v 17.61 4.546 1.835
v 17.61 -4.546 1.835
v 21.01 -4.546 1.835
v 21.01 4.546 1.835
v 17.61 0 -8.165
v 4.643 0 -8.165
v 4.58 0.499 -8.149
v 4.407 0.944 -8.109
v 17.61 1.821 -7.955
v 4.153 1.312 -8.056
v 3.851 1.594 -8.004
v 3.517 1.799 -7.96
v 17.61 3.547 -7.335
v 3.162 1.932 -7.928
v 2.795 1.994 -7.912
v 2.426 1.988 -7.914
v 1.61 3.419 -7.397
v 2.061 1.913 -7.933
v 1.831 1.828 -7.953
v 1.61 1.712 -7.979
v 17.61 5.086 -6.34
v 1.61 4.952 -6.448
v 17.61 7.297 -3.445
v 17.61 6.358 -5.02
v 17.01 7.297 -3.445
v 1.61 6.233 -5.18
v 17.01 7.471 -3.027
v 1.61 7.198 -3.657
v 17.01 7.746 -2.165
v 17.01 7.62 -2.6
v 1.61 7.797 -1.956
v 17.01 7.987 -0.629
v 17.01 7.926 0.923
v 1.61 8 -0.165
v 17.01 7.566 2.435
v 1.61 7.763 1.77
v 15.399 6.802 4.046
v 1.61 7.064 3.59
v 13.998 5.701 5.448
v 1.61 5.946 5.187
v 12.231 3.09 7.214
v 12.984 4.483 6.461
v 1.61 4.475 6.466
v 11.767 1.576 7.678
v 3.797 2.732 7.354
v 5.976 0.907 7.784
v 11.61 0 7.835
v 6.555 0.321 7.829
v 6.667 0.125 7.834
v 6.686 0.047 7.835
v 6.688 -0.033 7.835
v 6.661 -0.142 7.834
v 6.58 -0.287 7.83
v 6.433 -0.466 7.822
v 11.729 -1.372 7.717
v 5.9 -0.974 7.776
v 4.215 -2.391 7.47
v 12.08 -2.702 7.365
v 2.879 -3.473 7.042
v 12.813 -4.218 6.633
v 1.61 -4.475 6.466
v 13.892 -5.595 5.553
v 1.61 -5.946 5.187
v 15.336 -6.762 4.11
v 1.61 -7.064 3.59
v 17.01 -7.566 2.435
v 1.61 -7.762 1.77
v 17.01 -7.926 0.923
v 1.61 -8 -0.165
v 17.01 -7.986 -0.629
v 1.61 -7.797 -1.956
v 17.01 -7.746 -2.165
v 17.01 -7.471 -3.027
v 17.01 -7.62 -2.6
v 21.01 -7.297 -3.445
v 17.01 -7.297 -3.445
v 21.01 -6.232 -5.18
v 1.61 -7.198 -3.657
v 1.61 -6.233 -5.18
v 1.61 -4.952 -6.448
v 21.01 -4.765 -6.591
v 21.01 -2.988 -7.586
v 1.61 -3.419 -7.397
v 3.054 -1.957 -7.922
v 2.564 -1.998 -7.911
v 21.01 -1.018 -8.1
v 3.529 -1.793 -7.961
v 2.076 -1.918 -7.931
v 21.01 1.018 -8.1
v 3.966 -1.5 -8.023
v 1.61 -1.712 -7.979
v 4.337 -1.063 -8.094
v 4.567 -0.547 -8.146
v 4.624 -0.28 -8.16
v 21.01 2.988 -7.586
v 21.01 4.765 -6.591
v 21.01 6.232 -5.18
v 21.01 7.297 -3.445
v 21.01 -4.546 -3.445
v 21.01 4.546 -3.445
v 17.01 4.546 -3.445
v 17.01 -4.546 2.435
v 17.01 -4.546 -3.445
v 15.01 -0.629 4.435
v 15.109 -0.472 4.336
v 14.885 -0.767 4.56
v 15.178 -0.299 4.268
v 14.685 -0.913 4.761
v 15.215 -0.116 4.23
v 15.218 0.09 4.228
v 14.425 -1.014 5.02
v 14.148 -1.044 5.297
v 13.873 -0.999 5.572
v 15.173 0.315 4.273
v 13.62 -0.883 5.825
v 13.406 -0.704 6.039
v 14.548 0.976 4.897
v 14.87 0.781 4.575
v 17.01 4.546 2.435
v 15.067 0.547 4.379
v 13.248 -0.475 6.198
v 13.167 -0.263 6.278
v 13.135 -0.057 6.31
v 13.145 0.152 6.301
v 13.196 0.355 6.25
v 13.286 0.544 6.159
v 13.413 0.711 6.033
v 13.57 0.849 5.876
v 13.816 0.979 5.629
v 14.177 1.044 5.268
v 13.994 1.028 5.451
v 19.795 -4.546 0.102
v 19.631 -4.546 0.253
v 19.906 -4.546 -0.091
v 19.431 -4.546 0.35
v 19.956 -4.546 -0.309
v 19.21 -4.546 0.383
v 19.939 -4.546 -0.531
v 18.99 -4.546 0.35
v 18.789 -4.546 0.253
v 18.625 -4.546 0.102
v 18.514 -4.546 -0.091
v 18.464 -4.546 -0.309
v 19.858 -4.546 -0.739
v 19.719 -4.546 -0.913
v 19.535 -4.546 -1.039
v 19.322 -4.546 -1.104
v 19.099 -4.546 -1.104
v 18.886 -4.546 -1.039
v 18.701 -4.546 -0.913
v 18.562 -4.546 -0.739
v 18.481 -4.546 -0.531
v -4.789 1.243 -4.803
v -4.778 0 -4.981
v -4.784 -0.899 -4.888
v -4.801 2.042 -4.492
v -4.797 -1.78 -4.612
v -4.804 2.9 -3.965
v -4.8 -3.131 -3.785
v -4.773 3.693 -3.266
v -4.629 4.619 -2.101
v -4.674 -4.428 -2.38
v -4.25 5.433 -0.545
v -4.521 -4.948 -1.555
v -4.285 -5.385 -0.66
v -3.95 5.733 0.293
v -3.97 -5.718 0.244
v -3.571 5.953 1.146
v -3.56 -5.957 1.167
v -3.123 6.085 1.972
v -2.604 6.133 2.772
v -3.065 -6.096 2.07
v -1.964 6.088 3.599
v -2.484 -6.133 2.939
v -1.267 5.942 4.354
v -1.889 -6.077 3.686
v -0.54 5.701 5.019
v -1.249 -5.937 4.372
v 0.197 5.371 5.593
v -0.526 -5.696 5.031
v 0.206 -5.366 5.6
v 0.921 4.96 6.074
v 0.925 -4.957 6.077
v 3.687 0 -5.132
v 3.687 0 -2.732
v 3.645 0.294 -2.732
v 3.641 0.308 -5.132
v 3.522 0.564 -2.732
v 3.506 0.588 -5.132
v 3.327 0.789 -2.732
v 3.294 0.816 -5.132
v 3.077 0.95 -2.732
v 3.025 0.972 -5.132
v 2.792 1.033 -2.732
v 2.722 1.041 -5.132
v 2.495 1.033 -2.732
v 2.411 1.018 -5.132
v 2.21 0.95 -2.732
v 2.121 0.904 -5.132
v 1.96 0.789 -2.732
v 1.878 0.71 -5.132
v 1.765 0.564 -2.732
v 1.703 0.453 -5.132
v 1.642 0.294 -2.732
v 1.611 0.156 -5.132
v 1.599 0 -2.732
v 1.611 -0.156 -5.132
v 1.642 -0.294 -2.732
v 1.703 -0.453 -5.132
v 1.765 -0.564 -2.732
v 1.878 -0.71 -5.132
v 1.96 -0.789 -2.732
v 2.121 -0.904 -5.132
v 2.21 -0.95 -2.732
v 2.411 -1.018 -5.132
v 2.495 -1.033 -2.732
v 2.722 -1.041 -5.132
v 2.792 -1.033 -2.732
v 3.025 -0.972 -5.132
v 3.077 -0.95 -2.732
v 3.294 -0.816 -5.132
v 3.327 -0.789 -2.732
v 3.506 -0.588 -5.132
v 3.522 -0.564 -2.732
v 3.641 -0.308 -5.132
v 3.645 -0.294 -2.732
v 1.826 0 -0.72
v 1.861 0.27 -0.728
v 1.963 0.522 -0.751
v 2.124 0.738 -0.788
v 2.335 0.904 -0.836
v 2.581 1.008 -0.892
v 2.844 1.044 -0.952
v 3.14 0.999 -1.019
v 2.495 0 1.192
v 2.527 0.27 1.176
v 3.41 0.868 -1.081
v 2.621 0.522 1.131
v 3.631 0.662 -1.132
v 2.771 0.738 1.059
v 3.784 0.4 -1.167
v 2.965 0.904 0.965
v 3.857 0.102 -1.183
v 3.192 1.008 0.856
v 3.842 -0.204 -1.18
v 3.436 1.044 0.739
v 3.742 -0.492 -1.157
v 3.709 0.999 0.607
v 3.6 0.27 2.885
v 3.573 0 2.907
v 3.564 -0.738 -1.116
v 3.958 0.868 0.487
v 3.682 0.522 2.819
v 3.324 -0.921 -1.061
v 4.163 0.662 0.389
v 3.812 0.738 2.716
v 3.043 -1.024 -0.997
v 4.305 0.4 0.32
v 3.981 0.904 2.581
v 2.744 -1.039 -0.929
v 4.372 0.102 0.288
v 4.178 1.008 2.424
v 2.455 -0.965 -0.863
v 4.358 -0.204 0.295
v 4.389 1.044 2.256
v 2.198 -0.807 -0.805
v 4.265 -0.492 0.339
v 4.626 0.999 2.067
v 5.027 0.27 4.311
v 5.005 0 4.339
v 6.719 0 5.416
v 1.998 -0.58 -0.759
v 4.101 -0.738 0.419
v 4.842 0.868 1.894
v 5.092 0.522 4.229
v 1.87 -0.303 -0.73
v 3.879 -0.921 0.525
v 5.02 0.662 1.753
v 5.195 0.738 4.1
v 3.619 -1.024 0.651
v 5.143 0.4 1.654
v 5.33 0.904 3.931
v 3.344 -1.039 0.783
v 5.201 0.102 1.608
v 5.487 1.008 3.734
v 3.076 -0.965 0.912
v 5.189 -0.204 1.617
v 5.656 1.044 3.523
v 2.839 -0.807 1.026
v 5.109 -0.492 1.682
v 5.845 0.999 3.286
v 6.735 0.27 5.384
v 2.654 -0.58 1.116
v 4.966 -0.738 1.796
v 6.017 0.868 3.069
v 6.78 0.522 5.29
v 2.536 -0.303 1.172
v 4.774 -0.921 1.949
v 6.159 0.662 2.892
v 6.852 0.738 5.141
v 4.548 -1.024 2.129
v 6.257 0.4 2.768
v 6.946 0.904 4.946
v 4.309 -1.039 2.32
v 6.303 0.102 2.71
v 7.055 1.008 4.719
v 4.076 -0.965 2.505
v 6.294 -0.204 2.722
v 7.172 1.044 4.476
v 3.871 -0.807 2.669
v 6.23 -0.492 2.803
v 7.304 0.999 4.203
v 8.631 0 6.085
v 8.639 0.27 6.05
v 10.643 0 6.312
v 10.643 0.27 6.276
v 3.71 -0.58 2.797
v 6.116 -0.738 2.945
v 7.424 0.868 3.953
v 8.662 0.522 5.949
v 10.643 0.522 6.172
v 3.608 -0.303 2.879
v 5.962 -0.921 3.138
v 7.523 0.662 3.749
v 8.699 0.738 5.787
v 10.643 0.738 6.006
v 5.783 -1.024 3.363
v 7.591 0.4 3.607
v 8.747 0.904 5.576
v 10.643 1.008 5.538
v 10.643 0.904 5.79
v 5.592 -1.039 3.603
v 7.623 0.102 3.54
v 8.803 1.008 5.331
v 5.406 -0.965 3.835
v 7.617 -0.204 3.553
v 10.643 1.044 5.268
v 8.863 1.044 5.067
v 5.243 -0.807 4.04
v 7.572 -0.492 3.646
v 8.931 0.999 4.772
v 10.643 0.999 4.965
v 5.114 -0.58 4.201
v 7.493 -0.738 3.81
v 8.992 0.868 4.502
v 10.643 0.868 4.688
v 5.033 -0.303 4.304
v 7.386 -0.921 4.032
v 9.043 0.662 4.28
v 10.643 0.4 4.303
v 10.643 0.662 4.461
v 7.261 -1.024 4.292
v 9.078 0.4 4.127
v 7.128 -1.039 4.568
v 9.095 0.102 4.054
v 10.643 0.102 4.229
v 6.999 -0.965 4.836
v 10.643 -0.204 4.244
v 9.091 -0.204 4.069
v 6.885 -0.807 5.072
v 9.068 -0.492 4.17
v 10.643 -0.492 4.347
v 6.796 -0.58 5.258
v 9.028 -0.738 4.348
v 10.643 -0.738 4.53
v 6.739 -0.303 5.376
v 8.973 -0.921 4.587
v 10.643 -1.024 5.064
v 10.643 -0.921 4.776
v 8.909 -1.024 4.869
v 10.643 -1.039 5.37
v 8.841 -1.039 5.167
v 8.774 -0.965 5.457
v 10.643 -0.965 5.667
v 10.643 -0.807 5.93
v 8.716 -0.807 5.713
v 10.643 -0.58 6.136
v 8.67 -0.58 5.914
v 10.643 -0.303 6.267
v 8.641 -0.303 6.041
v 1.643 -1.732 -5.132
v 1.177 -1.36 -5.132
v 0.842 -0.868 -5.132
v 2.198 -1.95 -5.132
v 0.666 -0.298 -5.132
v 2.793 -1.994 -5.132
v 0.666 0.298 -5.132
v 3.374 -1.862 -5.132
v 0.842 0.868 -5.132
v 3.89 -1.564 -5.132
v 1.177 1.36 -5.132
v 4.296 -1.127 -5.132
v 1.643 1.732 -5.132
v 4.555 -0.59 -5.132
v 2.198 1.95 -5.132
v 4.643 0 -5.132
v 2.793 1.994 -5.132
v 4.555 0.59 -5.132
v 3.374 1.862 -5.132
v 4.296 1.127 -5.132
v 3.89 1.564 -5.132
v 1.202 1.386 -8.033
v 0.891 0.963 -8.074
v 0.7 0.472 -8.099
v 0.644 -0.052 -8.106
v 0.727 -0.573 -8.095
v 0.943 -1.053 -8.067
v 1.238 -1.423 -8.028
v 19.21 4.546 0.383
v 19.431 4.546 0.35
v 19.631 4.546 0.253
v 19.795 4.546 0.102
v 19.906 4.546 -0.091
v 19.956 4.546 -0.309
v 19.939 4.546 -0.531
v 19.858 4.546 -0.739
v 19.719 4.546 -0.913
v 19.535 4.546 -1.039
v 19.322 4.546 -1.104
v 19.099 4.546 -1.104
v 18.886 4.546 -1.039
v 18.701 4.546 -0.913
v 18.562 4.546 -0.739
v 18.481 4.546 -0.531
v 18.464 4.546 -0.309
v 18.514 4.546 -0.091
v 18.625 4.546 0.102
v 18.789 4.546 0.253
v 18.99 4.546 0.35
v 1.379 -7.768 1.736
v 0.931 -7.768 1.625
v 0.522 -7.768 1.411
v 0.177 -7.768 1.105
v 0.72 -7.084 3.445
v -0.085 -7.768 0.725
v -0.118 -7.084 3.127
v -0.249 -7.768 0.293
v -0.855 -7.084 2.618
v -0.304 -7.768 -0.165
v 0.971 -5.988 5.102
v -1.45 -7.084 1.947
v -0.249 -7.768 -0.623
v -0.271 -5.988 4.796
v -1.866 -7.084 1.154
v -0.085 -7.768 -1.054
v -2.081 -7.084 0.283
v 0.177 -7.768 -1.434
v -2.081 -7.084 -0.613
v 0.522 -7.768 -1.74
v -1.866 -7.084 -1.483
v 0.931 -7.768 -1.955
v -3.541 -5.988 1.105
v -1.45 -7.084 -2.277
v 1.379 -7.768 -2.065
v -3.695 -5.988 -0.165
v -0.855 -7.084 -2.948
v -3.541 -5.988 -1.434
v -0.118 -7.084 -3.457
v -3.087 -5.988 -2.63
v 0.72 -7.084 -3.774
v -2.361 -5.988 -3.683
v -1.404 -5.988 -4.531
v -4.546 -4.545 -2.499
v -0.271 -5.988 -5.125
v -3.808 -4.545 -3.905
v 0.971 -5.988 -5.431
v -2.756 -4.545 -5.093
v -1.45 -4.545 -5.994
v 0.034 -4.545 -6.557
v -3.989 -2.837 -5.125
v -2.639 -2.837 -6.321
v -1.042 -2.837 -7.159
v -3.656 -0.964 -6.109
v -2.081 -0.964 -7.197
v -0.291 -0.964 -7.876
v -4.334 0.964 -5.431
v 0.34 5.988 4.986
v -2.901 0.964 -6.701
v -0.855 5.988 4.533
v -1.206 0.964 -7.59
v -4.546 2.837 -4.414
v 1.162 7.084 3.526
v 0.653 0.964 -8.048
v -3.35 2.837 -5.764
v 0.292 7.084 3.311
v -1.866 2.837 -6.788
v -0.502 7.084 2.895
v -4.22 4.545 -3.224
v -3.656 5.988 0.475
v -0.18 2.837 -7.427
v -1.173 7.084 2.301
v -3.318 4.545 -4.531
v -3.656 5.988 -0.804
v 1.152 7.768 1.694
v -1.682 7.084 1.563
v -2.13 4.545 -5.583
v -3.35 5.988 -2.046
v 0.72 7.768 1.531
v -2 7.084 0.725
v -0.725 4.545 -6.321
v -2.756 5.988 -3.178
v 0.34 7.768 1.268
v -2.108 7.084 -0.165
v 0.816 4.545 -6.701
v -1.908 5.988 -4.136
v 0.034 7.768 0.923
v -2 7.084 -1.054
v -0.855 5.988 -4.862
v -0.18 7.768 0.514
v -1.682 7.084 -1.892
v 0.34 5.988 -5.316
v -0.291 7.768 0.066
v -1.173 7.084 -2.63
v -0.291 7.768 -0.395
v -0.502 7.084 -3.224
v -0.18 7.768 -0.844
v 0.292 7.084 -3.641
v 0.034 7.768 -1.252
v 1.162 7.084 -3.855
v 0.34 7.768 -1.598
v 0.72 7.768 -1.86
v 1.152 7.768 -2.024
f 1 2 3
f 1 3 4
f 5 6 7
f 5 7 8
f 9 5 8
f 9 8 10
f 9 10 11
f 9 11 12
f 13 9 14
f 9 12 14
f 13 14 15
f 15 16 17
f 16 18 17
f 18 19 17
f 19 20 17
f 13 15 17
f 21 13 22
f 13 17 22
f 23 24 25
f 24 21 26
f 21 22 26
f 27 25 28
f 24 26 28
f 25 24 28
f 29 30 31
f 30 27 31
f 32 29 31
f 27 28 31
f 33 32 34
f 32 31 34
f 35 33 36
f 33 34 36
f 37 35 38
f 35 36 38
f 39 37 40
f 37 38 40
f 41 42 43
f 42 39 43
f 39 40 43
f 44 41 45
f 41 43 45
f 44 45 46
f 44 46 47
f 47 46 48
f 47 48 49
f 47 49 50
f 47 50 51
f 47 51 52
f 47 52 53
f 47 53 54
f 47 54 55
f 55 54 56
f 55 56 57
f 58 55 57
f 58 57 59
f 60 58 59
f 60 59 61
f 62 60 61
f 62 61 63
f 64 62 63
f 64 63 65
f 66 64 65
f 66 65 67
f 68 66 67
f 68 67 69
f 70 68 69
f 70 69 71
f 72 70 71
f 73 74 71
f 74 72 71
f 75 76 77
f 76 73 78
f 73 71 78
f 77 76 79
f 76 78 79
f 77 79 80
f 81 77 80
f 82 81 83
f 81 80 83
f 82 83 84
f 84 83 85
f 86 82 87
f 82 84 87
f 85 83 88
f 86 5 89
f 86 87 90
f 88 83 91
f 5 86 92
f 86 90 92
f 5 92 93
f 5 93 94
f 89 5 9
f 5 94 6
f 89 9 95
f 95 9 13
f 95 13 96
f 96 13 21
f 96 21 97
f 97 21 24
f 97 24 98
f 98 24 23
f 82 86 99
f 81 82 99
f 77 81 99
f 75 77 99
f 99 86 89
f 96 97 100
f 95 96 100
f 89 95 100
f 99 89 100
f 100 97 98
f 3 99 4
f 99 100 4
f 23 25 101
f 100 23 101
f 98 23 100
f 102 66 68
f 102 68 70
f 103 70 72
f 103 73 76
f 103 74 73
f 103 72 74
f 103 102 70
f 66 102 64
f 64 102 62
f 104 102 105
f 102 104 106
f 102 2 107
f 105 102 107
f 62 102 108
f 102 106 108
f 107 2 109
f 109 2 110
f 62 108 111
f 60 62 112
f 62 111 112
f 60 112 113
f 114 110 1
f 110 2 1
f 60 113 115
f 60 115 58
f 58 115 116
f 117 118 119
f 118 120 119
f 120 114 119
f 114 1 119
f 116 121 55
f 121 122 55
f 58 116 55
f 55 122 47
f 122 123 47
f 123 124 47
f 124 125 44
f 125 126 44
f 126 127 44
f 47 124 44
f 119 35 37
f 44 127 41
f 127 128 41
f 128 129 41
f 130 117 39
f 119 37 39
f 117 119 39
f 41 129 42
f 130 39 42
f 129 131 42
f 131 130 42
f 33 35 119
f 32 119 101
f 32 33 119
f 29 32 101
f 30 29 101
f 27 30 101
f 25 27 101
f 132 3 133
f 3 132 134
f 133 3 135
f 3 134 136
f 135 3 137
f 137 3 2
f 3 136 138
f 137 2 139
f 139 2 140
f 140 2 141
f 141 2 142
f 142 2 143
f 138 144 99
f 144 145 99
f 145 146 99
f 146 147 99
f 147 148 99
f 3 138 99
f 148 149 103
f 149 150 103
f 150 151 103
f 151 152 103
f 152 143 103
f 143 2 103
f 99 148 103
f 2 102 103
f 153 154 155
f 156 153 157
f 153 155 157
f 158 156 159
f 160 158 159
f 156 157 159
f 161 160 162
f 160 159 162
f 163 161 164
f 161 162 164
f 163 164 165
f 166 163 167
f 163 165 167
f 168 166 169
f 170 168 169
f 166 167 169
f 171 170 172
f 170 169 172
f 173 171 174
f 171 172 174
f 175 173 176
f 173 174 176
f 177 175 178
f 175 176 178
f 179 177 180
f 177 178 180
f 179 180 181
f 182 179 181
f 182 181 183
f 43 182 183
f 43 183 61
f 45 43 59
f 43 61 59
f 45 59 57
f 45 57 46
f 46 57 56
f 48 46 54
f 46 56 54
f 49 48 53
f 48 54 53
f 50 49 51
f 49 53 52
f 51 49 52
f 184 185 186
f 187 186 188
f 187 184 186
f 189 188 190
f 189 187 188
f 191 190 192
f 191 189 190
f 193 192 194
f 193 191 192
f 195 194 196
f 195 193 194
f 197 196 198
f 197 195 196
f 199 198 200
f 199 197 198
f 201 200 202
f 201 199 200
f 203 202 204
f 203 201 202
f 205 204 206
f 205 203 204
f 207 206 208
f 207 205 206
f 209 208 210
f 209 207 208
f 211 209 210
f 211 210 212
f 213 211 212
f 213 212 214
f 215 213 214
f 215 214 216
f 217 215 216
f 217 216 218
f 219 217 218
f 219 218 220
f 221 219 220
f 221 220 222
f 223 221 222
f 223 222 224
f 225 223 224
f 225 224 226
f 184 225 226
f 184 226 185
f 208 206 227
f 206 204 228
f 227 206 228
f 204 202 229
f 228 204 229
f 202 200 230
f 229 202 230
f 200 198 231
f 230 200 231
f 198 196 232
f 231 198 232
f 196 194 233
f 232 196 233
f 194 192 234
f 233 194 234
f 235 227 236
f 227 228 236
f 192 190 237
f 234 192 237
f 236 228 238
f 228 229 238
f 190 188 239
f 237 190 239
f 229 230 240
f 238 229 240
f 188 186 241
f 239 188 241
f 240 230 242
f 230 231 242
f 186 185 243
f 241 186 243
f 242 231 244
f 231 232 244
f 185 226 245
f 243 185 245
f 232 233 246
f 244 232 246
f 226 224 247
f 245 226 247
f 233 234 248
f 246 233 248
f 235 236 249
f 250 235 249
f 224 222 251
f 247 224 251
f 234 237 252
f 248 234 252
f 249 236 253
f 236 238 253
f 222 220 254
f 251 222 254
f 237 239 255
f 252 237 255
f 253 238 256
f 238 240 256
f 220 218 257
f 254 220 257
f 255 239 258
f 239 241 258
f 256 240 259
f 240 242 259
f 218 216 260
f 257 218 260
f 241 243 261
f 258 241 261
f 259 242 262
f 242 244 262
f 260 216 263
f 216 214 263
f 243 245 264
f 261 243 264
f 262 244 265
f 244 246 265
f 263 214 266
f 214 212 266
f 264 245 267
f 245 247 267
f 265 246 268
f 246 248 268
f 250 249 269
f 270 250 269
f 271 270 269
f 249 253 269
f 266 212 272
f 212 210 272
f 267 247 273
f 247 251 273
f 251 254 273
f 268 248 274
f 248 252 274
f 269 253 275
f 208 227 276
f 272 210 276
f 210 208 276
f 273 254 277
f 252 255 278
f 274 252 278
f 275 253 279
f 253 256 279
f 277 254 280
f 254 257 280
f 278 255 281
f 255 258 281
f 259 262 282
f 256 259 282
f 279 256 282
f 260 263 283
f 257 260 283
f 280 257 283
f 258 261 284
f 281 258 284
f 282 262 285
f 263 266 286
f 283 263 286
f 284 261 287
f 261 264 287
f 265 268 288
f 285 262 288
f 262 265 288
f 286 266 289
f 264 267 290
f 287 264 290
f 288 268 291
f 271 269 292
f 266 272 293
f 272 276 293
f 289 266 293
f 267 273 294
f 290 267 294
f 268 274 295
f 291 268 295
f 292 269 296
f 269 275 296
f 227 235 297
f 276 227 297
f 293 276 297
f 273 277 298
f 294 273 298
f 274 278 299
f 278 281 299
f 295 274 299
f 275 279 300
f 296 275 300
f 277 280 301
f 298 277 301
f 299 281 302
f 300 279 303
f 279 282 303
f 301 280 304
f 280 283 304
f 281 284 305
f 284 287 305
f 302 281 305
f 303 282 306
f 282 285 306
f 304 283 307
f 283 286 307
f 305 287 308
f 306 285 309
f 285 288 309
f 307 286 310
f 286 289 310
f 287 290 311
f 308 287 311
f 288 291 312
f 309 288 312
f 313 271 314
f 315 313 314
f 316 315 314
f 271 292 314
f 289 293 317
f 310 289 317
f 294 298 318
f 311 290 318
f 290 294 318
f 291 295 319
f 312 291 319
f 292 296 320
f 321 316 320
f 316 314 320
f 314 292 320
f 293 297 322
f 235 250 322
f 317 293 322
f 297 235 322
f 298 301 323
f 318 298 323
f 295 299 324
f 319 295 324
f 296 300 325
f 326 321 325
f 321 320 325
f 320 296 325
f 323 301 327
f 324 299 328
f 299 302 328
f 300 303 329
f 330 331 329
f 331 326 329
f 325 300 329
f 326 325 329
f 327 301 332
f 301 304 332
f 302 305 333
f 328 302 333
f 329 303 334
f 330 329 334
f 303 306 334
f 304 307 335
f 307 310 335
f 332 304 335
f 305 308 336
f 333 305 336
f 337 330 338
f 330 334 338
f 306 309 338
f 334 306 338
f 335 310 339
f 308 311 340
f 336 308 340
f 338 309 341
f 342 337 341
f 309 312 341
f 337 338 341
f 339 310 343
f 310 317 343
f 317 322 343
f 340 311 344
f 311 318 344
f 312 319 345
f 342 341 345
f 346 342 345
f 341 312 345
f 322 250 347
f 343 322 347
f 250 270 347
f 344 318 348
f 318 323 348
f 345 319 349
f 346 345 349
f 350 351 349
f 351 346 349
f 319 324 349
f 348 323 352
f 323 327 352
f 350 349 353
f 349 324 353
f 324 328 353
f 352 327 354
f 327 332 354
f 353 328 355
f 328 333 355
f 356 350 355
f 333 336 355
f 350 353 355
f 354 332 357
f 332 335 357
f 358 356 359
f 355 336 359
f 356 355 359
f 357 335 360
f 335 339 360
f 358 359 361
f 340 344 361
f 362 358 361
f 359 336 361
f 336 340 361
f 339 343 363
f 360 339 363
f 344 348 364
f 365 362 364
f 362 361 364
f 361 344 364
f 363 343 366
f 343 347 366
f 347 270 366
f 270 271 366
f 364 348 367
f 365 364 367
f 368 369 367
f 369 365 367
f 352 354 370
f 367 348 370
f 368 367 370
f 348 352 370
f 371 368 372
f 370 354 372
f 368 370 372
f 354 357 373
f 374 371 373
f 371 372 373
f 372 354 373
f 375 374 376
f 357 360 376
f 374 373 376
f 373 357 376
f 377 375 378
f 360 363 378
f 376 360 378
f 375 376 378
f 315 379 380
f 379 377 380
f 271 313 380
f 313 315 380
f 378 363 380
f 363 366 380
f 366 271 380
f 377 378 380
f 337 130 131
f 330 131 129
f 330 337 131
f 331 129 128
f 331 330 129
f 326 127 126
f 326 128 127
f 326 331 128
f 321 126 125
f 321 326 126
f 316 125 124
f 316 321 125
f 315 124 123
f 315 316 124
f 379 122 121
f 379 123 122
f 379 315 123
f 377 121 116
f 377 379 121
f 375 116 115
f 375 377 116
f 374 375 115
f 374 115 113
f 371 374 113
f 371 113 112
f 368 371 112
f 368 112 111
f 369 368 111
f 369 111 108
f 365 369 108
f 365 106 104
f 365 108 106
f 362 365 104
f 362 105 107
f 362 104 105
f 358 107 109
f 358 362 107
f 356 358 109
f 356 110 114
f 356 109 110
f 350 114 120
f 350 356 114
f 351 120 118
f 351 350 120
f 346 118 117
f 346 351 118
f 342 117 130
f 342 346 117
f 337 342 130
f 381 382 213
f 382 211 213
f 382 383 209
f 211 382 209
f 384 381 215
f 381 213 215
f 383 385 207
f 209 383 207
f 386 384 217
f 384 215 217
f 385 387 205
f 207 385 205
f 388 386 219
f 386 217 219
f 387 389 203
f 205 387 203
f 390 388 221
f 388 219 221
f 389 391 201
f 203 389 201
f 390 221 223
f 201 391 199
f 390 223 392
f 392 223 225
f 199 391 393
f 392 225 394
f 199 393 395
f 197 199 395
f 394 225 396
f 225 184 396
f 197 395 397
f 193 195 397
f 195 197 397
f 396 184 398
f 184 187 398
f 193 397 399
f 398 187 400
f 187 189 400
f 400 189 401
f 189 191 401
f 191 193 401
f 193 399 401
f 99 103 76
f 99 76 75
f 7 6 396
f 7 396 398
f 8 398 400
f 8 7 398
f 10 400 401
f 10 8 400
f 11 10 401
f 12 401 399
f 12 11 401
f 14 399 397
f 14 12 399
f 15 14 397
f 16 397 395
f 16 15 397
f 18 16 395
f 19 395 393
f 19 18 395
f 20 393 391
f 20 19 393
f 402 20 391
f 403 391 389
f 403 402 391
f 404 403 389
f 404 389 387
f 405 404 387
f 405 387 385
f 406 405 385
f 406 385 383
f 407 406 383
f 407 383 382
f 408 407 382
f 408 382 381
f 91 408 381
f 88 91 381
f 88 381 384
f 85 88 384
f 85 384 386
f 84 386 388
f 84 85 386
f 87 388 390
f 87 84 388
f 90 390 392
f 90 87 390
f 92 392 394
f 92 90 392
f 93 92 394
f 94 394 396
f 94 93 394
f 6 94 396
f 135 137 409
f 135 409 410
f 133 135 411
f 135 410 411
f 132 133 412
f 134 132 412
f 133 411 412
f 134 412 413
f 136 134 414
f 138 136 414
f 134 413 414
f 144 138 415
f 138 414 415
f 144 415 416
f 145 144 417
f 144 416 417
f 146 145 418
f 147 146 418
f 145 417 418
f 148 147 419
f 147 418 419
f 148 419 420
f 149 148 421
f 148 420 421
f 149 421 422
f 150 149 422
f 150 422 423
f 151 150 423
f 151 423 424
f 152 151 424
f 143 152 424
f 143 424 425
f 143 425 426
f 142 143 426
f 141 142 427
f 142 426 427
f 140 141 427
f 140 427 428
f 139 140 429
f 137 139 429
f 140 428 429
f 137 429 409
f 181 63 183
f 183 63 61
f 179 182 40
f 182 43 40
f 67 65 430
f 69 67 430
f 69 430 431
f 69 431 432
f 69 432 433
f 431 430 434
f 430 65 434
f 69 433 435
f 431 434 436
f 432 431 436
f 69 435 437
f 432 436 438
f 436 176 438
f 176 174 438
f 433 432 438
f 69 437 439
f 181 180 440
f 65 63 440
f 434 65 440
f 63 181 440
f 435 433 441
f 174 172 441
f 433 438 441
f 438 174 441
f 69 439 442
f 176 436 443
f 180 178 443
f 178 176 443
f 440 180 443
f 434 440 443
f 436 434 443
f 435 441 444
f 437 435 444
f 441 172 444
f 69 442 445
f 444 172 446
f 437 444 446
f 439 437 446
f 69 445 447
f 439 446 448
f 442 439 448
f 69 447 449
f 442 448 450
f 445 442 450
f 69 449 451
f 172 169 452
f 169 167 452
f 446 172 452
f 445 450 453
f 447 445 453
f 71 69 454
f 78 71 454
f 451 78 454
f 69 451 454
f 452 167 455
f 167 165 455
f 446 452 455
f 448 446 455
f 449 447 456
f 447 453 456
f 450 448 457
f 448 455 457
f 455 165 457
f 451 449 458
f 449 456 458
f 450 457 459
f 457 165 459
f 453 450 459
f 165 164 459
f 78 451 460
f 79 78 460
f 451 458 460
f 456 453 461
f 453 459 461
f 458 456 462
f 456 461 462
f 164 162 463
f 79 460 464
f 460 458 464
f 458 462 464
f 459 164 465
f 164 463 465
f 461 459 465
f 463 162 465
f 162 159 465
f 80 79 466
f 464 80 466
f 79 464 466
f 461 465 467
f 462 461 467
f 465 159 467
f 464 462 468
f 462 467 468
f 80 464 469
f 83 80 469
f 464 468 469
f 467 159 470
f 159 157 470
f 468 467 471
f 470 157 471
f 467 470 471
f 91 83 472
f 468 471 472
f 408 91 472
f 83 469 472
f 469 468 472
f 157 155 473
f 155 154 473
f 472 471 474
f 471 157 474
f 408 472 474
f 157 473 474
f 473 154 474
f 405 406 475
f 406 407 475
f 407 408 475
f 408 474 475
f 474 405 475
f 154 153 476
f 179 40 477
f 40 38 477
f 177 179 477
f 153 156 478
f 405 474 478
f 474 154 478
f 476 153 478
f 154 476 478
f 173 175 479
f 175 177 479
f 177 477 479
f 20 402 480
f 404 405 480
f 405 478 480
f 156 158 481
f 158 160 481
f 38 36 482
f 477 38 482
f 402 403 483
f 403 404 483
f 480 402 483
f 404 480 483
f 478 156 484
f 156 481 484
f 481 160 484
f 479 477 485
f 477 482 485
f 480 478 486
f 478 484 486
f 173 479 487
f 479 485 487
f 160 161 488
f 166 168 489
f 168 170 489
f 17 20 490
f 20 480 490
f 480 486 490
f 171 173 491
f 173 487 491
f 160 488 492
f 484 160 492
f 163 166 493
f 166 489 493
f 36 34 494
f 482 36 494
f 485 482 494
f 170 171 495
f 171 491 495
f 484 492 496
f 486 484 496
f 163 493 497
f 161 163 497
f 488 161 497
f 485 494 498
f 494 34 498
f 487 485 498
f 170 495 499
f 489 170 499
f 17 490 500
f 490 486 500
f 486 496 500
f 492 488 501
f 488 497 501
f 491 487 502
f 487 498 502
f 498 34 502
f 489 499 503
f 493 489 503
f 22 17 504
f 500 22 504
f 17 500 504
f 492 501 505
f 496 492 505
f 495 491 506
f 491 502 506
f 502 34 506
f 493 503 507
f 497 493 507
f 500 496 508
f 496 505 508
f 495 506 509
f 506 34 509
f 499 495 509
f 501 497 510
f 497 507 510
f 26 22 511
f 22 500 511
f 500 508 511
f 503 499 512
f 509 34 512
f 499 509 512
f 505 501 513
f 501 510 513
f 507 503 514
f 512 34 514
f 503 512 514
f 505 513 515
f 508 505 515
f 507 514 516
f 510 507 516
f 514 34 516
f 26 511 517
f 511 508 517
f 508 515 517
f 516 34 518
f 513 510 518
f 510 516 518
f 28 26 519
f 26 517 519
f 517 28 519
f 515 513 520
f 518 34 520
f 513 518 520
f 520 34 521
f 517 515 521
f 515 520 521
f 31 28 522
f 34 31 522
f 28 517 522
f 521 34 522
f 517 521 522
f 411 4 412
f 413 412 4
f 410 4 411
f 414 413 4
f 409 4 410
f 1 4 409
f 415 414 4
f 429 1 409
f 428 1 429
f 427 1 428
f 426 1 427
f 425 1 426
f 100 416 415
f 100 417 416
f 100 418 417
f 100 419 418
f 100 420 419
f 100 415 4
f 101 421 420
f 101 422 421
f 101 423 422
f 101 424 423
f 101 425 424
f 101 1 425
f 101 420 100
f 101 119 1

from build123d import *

# Parameters (mm, degrees)
SKETCH1_R                = 10
BOSS_EXTRUDE1_DEPTH      = 20
CUT_EXTRUDE10_DEPTH      = 12
CUT_EXTRUDE10_DEPTH_BACK = 12
CUT_SWEEP1_START         = -6.209273082
CUT_SWEEP1_OUTLINE_R     = 1.305
CUT_SWEEP1_DEPTH         = 3
CUT_SWEEP1_START_2       = 11.29177872
CUT_SWEEP1_2_OUTLINE_R   = 1.305
CUT_SWEEP1_2_DEPTH       = 8.70822128
CUT_SWEEP1_3_OUTLINE_R   = 1.305
CUT_SWEEP1_3_ANGLE       = 90
CUT_SWEEP2_START         = -11
CUT_SWEEP2_OUTLINE_R     = 2.5
CUT_SWEEP2_DEPTH         = 4.790726918
SKETCH25_W               = 5
SKETCH25_H               = 11.364916732
BOSS_EXTRUDE3_DEPTH      = 4.25
BOSS_EXTRUDE4_DEPTH      = 4.25
SKETCH27_R               = 0.935
CUT_EXTRUDE11_DEPTH      = 17.125
CUT_EXTRUDE12_START      = -0.75
CUT_EXTRUDE12_DEPTH      = 0.75
CUT_EXTRUDE13_DEPTH      = 10.375
SKETCH30_W               = 5
SKETCH30_H               = 4
CUT_EXTRUDE14_DEPTH      = 1.6
SCALE2_SCALE             = 0.8


with BuildPart() as part:
    # Sketch1 → Boss-Extrude1 (new body)
    with BuildSketch(Plane(origin=(0, 0, 0), x_dir=(0, 0, -1), z_dir=(1, 0, 0))):
        Circle(SKETCH1_R)
    extrude(amount=BOSS_EXTRUDE1_DEPTH)

    # Sketch12 → Revolve1 (revolve)
    with BuildSketch(Plane.XY):
        with BuildLine():
            Line((0, 10), (0, -10))
            ThreePointArc((0, -10), (-10, 0), (0, 10))
        make_face()
    revolve(axis=Axis((0, 10, 0), (0, -1, 0)))

    # Sketch13 → Cut-Extrude10 (cut, two sides: drawn at the far end of the back side and taken through both)
    with BuildSketch(Plane(origin=(0, 0, 0), x_dir=(1, 0, 0), z_dir=(0, 1, 0)).offset(-CUT_EXTRUDE10_DEPTH_BACK)):
        with BuildLine():
            ThreePointArc((-7.984675672, 6.020378262), (-3.764408562, -5.478068678), (7.618784032, -10))
            ThreePointArc((7.618784032, -10), (-7.804645707, -9.413161624), (-7.984675672, 6.020378262))
        make_face()
    extrude(amount=CUT_EXTRUDE10_DEPTH + CUT_EXTRUDE10_DEPTH_BACK, mode=Mode.SUBTRACT)

    # Cut-Sweep1: read off the stored shape, not the designer's step
    # Cut-Sweep1 outline → Cut-Sweep1 (cut)
    with BuildSketch(Plane.XY.offset(CUT_SWEEP1_START)):
        with Locations((1.29177882, 0)):
            Circle(CUT_SWEEP1_OUTLINE_R)
    extrude(amount=CUT_SWEEP1_DEPTH, mode=Mode.SUBTRACT)

    # Cut-Sweep1 2 outline → Cut-Sweep1 2 (cut)
    with BuildSketch(Plane.YZ.offset(CUT_SWEEP1_START_2)):
        with Locations((0, 6.790726918)):
            Circle(CUT_SWEEP1_2_OUTLINE_R)
    extrude(amount=CUT_SWEEP1_2_DEPTH, mode=Mode.SUBTRACT)

    # Cut-Sweep1 3 outline → Cut-Sweep1 3 (revolve, cut)
    with BuildSketch(Plane(origin=(11.29177882, 0, -3.209273082), x_dir=(-1, 0, 0), z_dir=(0, 0, -1))):
        with Locations((10, 0)):
            Circle(CUT_SWEEP1_3_OUTLINE_R)
    revolve(axis=Axis((11.29177882, 0, -3.209273082), (0, 1, 0)), revolution_arc=CUT_SWEEP1_3_ANGLE, mode=Mode.SUBTRACT)

    # Cut-Sweep2: read off the stored shape, not the designer's step
    # Cut-Sweep2 outline → Cut-Sweep2 (cut)
    with BuildSketch(Plane.XY.offset(CUT_SWEEP2_START)):
        with Locations((1.29177882, 0)):
            Circle(CUT_SWEEP2_OUTLINE_R)
    extrude(amount=CUT_SWEEP2_DEPTH, mode=Mode.SUBTRACT)

    # Sketch25 → Boss-Extrude3 (add)
    with BuildSketch(Plane(origin=(20, 0, 0), x_dir=(0, 0, -1), z_dir=(1, 0, 0))):
        Rectangle(SKETCH25_W, SKETCH25_H)
    extrude(amount=BOSS_EXTRUDE3_DEPTH)

    # Sketch26 → Boss-Extrude4 (add)
    with BuildSketch(Plane(origin=(20, 0, 0), x_dir=(0, 0, -1), z_dir=(1, 0, 0))):
        with BuildLine():
            Line((2.5, -9.682458366), (2.5, 9.682458366))
            ThreePointArc((2.5, 9.682458366), (10, 0), (2.5, -9.682458366))
        make_face()
    extrude(amount=BOSS_EXTRUDE4_DEPTH)

    # Sketch27 → Cut-Extrude11 (cut, symmetric)
    with BuildSketch(Plane(origin=(0, 0, 0), x_dir=(1, 0, 0), z_dir=(0, 1, 0))):
        with Locations(Location((22, 0.25, 0), (0, 0, 270))):
            Circle(SKETCH27_R)
    extrude(amount=CUT_EXTRUDE11_DEPTH, both=True, mode=Mode.SUBTRACT)

    # Sketch28 → Cut-Extrude12 (cut)
    with BuildSketch(Plane(origin=(20, 0, 0), x_dir=(0, 0, -1), z_dir=(1, 0, 0)).offset(CUT_EXTRUDE12_START)):
        with BuildLine():
            Line((2.5, -9.682458366), (2.5, -5.682458366))
            Line((2.5, -5.682458366), (-8.228588392, -5.682458366))
            ThreePointArc((-8.228588392, -5.682458366), (-3.493448331, -9.369942303), (2.5, -9.682458366))
        make_face()
        with BuildLine():
            Line((-8.228588392, 5.682458366), (2.5, 5.682458366))
            Line((2.5, 5.682458366), (2.5, 9.682458366))
            ThreePointArc((2.5, 9.682458366), (-3.493448331, 9.369942303), (-8.228588392, 5.682458366))
        make_face()
    extrude(amount=CUT_EXTRUDE12_DEPTH, mode=Mode.SUBTRACT)

    # Sketch29 → Cut-Extrude13 (cut, symmetric)
    with BuildSketch(Plane(origin=(0, 0, 0), x_dir=(1, 0, 0), z_dir=(0, 1, 0))):
        Polygon((20, -8.228588392), (20, -2.5), (12.5, -10), (20, -10), align=None)
    extrude(amount=CUT_EXTRUDE13_DEPTH, both=True, mode=Mode.SUBTRACT)

    # Sketch30 → Cut-Extrude14 (cut)
    with BuildSketch(Plane.XY.offset(-2.5)):
        with Locations((21.75, 7.682458366)):
            Rectangle(SKETCH30_W, SKETCH30_H)
        with Locations((21.75, -7.682458366)):
            Rectangle(SKETCH30_W, SKETCH30_H)
    extrude(amount=-CUT_EXTRUDE14_DEPTH, mode=Mode.SUBTRACT)


with BuildPart() as part_1:
    # Scale2: scaled about (8.050299805, 3.9953e-05, -0.823625188)
    add(part.part.scale(SCALE2_SCALE).moved(Location((1.610059961, 7.991e-06, -0.164725038))))


solid = part_1.part
